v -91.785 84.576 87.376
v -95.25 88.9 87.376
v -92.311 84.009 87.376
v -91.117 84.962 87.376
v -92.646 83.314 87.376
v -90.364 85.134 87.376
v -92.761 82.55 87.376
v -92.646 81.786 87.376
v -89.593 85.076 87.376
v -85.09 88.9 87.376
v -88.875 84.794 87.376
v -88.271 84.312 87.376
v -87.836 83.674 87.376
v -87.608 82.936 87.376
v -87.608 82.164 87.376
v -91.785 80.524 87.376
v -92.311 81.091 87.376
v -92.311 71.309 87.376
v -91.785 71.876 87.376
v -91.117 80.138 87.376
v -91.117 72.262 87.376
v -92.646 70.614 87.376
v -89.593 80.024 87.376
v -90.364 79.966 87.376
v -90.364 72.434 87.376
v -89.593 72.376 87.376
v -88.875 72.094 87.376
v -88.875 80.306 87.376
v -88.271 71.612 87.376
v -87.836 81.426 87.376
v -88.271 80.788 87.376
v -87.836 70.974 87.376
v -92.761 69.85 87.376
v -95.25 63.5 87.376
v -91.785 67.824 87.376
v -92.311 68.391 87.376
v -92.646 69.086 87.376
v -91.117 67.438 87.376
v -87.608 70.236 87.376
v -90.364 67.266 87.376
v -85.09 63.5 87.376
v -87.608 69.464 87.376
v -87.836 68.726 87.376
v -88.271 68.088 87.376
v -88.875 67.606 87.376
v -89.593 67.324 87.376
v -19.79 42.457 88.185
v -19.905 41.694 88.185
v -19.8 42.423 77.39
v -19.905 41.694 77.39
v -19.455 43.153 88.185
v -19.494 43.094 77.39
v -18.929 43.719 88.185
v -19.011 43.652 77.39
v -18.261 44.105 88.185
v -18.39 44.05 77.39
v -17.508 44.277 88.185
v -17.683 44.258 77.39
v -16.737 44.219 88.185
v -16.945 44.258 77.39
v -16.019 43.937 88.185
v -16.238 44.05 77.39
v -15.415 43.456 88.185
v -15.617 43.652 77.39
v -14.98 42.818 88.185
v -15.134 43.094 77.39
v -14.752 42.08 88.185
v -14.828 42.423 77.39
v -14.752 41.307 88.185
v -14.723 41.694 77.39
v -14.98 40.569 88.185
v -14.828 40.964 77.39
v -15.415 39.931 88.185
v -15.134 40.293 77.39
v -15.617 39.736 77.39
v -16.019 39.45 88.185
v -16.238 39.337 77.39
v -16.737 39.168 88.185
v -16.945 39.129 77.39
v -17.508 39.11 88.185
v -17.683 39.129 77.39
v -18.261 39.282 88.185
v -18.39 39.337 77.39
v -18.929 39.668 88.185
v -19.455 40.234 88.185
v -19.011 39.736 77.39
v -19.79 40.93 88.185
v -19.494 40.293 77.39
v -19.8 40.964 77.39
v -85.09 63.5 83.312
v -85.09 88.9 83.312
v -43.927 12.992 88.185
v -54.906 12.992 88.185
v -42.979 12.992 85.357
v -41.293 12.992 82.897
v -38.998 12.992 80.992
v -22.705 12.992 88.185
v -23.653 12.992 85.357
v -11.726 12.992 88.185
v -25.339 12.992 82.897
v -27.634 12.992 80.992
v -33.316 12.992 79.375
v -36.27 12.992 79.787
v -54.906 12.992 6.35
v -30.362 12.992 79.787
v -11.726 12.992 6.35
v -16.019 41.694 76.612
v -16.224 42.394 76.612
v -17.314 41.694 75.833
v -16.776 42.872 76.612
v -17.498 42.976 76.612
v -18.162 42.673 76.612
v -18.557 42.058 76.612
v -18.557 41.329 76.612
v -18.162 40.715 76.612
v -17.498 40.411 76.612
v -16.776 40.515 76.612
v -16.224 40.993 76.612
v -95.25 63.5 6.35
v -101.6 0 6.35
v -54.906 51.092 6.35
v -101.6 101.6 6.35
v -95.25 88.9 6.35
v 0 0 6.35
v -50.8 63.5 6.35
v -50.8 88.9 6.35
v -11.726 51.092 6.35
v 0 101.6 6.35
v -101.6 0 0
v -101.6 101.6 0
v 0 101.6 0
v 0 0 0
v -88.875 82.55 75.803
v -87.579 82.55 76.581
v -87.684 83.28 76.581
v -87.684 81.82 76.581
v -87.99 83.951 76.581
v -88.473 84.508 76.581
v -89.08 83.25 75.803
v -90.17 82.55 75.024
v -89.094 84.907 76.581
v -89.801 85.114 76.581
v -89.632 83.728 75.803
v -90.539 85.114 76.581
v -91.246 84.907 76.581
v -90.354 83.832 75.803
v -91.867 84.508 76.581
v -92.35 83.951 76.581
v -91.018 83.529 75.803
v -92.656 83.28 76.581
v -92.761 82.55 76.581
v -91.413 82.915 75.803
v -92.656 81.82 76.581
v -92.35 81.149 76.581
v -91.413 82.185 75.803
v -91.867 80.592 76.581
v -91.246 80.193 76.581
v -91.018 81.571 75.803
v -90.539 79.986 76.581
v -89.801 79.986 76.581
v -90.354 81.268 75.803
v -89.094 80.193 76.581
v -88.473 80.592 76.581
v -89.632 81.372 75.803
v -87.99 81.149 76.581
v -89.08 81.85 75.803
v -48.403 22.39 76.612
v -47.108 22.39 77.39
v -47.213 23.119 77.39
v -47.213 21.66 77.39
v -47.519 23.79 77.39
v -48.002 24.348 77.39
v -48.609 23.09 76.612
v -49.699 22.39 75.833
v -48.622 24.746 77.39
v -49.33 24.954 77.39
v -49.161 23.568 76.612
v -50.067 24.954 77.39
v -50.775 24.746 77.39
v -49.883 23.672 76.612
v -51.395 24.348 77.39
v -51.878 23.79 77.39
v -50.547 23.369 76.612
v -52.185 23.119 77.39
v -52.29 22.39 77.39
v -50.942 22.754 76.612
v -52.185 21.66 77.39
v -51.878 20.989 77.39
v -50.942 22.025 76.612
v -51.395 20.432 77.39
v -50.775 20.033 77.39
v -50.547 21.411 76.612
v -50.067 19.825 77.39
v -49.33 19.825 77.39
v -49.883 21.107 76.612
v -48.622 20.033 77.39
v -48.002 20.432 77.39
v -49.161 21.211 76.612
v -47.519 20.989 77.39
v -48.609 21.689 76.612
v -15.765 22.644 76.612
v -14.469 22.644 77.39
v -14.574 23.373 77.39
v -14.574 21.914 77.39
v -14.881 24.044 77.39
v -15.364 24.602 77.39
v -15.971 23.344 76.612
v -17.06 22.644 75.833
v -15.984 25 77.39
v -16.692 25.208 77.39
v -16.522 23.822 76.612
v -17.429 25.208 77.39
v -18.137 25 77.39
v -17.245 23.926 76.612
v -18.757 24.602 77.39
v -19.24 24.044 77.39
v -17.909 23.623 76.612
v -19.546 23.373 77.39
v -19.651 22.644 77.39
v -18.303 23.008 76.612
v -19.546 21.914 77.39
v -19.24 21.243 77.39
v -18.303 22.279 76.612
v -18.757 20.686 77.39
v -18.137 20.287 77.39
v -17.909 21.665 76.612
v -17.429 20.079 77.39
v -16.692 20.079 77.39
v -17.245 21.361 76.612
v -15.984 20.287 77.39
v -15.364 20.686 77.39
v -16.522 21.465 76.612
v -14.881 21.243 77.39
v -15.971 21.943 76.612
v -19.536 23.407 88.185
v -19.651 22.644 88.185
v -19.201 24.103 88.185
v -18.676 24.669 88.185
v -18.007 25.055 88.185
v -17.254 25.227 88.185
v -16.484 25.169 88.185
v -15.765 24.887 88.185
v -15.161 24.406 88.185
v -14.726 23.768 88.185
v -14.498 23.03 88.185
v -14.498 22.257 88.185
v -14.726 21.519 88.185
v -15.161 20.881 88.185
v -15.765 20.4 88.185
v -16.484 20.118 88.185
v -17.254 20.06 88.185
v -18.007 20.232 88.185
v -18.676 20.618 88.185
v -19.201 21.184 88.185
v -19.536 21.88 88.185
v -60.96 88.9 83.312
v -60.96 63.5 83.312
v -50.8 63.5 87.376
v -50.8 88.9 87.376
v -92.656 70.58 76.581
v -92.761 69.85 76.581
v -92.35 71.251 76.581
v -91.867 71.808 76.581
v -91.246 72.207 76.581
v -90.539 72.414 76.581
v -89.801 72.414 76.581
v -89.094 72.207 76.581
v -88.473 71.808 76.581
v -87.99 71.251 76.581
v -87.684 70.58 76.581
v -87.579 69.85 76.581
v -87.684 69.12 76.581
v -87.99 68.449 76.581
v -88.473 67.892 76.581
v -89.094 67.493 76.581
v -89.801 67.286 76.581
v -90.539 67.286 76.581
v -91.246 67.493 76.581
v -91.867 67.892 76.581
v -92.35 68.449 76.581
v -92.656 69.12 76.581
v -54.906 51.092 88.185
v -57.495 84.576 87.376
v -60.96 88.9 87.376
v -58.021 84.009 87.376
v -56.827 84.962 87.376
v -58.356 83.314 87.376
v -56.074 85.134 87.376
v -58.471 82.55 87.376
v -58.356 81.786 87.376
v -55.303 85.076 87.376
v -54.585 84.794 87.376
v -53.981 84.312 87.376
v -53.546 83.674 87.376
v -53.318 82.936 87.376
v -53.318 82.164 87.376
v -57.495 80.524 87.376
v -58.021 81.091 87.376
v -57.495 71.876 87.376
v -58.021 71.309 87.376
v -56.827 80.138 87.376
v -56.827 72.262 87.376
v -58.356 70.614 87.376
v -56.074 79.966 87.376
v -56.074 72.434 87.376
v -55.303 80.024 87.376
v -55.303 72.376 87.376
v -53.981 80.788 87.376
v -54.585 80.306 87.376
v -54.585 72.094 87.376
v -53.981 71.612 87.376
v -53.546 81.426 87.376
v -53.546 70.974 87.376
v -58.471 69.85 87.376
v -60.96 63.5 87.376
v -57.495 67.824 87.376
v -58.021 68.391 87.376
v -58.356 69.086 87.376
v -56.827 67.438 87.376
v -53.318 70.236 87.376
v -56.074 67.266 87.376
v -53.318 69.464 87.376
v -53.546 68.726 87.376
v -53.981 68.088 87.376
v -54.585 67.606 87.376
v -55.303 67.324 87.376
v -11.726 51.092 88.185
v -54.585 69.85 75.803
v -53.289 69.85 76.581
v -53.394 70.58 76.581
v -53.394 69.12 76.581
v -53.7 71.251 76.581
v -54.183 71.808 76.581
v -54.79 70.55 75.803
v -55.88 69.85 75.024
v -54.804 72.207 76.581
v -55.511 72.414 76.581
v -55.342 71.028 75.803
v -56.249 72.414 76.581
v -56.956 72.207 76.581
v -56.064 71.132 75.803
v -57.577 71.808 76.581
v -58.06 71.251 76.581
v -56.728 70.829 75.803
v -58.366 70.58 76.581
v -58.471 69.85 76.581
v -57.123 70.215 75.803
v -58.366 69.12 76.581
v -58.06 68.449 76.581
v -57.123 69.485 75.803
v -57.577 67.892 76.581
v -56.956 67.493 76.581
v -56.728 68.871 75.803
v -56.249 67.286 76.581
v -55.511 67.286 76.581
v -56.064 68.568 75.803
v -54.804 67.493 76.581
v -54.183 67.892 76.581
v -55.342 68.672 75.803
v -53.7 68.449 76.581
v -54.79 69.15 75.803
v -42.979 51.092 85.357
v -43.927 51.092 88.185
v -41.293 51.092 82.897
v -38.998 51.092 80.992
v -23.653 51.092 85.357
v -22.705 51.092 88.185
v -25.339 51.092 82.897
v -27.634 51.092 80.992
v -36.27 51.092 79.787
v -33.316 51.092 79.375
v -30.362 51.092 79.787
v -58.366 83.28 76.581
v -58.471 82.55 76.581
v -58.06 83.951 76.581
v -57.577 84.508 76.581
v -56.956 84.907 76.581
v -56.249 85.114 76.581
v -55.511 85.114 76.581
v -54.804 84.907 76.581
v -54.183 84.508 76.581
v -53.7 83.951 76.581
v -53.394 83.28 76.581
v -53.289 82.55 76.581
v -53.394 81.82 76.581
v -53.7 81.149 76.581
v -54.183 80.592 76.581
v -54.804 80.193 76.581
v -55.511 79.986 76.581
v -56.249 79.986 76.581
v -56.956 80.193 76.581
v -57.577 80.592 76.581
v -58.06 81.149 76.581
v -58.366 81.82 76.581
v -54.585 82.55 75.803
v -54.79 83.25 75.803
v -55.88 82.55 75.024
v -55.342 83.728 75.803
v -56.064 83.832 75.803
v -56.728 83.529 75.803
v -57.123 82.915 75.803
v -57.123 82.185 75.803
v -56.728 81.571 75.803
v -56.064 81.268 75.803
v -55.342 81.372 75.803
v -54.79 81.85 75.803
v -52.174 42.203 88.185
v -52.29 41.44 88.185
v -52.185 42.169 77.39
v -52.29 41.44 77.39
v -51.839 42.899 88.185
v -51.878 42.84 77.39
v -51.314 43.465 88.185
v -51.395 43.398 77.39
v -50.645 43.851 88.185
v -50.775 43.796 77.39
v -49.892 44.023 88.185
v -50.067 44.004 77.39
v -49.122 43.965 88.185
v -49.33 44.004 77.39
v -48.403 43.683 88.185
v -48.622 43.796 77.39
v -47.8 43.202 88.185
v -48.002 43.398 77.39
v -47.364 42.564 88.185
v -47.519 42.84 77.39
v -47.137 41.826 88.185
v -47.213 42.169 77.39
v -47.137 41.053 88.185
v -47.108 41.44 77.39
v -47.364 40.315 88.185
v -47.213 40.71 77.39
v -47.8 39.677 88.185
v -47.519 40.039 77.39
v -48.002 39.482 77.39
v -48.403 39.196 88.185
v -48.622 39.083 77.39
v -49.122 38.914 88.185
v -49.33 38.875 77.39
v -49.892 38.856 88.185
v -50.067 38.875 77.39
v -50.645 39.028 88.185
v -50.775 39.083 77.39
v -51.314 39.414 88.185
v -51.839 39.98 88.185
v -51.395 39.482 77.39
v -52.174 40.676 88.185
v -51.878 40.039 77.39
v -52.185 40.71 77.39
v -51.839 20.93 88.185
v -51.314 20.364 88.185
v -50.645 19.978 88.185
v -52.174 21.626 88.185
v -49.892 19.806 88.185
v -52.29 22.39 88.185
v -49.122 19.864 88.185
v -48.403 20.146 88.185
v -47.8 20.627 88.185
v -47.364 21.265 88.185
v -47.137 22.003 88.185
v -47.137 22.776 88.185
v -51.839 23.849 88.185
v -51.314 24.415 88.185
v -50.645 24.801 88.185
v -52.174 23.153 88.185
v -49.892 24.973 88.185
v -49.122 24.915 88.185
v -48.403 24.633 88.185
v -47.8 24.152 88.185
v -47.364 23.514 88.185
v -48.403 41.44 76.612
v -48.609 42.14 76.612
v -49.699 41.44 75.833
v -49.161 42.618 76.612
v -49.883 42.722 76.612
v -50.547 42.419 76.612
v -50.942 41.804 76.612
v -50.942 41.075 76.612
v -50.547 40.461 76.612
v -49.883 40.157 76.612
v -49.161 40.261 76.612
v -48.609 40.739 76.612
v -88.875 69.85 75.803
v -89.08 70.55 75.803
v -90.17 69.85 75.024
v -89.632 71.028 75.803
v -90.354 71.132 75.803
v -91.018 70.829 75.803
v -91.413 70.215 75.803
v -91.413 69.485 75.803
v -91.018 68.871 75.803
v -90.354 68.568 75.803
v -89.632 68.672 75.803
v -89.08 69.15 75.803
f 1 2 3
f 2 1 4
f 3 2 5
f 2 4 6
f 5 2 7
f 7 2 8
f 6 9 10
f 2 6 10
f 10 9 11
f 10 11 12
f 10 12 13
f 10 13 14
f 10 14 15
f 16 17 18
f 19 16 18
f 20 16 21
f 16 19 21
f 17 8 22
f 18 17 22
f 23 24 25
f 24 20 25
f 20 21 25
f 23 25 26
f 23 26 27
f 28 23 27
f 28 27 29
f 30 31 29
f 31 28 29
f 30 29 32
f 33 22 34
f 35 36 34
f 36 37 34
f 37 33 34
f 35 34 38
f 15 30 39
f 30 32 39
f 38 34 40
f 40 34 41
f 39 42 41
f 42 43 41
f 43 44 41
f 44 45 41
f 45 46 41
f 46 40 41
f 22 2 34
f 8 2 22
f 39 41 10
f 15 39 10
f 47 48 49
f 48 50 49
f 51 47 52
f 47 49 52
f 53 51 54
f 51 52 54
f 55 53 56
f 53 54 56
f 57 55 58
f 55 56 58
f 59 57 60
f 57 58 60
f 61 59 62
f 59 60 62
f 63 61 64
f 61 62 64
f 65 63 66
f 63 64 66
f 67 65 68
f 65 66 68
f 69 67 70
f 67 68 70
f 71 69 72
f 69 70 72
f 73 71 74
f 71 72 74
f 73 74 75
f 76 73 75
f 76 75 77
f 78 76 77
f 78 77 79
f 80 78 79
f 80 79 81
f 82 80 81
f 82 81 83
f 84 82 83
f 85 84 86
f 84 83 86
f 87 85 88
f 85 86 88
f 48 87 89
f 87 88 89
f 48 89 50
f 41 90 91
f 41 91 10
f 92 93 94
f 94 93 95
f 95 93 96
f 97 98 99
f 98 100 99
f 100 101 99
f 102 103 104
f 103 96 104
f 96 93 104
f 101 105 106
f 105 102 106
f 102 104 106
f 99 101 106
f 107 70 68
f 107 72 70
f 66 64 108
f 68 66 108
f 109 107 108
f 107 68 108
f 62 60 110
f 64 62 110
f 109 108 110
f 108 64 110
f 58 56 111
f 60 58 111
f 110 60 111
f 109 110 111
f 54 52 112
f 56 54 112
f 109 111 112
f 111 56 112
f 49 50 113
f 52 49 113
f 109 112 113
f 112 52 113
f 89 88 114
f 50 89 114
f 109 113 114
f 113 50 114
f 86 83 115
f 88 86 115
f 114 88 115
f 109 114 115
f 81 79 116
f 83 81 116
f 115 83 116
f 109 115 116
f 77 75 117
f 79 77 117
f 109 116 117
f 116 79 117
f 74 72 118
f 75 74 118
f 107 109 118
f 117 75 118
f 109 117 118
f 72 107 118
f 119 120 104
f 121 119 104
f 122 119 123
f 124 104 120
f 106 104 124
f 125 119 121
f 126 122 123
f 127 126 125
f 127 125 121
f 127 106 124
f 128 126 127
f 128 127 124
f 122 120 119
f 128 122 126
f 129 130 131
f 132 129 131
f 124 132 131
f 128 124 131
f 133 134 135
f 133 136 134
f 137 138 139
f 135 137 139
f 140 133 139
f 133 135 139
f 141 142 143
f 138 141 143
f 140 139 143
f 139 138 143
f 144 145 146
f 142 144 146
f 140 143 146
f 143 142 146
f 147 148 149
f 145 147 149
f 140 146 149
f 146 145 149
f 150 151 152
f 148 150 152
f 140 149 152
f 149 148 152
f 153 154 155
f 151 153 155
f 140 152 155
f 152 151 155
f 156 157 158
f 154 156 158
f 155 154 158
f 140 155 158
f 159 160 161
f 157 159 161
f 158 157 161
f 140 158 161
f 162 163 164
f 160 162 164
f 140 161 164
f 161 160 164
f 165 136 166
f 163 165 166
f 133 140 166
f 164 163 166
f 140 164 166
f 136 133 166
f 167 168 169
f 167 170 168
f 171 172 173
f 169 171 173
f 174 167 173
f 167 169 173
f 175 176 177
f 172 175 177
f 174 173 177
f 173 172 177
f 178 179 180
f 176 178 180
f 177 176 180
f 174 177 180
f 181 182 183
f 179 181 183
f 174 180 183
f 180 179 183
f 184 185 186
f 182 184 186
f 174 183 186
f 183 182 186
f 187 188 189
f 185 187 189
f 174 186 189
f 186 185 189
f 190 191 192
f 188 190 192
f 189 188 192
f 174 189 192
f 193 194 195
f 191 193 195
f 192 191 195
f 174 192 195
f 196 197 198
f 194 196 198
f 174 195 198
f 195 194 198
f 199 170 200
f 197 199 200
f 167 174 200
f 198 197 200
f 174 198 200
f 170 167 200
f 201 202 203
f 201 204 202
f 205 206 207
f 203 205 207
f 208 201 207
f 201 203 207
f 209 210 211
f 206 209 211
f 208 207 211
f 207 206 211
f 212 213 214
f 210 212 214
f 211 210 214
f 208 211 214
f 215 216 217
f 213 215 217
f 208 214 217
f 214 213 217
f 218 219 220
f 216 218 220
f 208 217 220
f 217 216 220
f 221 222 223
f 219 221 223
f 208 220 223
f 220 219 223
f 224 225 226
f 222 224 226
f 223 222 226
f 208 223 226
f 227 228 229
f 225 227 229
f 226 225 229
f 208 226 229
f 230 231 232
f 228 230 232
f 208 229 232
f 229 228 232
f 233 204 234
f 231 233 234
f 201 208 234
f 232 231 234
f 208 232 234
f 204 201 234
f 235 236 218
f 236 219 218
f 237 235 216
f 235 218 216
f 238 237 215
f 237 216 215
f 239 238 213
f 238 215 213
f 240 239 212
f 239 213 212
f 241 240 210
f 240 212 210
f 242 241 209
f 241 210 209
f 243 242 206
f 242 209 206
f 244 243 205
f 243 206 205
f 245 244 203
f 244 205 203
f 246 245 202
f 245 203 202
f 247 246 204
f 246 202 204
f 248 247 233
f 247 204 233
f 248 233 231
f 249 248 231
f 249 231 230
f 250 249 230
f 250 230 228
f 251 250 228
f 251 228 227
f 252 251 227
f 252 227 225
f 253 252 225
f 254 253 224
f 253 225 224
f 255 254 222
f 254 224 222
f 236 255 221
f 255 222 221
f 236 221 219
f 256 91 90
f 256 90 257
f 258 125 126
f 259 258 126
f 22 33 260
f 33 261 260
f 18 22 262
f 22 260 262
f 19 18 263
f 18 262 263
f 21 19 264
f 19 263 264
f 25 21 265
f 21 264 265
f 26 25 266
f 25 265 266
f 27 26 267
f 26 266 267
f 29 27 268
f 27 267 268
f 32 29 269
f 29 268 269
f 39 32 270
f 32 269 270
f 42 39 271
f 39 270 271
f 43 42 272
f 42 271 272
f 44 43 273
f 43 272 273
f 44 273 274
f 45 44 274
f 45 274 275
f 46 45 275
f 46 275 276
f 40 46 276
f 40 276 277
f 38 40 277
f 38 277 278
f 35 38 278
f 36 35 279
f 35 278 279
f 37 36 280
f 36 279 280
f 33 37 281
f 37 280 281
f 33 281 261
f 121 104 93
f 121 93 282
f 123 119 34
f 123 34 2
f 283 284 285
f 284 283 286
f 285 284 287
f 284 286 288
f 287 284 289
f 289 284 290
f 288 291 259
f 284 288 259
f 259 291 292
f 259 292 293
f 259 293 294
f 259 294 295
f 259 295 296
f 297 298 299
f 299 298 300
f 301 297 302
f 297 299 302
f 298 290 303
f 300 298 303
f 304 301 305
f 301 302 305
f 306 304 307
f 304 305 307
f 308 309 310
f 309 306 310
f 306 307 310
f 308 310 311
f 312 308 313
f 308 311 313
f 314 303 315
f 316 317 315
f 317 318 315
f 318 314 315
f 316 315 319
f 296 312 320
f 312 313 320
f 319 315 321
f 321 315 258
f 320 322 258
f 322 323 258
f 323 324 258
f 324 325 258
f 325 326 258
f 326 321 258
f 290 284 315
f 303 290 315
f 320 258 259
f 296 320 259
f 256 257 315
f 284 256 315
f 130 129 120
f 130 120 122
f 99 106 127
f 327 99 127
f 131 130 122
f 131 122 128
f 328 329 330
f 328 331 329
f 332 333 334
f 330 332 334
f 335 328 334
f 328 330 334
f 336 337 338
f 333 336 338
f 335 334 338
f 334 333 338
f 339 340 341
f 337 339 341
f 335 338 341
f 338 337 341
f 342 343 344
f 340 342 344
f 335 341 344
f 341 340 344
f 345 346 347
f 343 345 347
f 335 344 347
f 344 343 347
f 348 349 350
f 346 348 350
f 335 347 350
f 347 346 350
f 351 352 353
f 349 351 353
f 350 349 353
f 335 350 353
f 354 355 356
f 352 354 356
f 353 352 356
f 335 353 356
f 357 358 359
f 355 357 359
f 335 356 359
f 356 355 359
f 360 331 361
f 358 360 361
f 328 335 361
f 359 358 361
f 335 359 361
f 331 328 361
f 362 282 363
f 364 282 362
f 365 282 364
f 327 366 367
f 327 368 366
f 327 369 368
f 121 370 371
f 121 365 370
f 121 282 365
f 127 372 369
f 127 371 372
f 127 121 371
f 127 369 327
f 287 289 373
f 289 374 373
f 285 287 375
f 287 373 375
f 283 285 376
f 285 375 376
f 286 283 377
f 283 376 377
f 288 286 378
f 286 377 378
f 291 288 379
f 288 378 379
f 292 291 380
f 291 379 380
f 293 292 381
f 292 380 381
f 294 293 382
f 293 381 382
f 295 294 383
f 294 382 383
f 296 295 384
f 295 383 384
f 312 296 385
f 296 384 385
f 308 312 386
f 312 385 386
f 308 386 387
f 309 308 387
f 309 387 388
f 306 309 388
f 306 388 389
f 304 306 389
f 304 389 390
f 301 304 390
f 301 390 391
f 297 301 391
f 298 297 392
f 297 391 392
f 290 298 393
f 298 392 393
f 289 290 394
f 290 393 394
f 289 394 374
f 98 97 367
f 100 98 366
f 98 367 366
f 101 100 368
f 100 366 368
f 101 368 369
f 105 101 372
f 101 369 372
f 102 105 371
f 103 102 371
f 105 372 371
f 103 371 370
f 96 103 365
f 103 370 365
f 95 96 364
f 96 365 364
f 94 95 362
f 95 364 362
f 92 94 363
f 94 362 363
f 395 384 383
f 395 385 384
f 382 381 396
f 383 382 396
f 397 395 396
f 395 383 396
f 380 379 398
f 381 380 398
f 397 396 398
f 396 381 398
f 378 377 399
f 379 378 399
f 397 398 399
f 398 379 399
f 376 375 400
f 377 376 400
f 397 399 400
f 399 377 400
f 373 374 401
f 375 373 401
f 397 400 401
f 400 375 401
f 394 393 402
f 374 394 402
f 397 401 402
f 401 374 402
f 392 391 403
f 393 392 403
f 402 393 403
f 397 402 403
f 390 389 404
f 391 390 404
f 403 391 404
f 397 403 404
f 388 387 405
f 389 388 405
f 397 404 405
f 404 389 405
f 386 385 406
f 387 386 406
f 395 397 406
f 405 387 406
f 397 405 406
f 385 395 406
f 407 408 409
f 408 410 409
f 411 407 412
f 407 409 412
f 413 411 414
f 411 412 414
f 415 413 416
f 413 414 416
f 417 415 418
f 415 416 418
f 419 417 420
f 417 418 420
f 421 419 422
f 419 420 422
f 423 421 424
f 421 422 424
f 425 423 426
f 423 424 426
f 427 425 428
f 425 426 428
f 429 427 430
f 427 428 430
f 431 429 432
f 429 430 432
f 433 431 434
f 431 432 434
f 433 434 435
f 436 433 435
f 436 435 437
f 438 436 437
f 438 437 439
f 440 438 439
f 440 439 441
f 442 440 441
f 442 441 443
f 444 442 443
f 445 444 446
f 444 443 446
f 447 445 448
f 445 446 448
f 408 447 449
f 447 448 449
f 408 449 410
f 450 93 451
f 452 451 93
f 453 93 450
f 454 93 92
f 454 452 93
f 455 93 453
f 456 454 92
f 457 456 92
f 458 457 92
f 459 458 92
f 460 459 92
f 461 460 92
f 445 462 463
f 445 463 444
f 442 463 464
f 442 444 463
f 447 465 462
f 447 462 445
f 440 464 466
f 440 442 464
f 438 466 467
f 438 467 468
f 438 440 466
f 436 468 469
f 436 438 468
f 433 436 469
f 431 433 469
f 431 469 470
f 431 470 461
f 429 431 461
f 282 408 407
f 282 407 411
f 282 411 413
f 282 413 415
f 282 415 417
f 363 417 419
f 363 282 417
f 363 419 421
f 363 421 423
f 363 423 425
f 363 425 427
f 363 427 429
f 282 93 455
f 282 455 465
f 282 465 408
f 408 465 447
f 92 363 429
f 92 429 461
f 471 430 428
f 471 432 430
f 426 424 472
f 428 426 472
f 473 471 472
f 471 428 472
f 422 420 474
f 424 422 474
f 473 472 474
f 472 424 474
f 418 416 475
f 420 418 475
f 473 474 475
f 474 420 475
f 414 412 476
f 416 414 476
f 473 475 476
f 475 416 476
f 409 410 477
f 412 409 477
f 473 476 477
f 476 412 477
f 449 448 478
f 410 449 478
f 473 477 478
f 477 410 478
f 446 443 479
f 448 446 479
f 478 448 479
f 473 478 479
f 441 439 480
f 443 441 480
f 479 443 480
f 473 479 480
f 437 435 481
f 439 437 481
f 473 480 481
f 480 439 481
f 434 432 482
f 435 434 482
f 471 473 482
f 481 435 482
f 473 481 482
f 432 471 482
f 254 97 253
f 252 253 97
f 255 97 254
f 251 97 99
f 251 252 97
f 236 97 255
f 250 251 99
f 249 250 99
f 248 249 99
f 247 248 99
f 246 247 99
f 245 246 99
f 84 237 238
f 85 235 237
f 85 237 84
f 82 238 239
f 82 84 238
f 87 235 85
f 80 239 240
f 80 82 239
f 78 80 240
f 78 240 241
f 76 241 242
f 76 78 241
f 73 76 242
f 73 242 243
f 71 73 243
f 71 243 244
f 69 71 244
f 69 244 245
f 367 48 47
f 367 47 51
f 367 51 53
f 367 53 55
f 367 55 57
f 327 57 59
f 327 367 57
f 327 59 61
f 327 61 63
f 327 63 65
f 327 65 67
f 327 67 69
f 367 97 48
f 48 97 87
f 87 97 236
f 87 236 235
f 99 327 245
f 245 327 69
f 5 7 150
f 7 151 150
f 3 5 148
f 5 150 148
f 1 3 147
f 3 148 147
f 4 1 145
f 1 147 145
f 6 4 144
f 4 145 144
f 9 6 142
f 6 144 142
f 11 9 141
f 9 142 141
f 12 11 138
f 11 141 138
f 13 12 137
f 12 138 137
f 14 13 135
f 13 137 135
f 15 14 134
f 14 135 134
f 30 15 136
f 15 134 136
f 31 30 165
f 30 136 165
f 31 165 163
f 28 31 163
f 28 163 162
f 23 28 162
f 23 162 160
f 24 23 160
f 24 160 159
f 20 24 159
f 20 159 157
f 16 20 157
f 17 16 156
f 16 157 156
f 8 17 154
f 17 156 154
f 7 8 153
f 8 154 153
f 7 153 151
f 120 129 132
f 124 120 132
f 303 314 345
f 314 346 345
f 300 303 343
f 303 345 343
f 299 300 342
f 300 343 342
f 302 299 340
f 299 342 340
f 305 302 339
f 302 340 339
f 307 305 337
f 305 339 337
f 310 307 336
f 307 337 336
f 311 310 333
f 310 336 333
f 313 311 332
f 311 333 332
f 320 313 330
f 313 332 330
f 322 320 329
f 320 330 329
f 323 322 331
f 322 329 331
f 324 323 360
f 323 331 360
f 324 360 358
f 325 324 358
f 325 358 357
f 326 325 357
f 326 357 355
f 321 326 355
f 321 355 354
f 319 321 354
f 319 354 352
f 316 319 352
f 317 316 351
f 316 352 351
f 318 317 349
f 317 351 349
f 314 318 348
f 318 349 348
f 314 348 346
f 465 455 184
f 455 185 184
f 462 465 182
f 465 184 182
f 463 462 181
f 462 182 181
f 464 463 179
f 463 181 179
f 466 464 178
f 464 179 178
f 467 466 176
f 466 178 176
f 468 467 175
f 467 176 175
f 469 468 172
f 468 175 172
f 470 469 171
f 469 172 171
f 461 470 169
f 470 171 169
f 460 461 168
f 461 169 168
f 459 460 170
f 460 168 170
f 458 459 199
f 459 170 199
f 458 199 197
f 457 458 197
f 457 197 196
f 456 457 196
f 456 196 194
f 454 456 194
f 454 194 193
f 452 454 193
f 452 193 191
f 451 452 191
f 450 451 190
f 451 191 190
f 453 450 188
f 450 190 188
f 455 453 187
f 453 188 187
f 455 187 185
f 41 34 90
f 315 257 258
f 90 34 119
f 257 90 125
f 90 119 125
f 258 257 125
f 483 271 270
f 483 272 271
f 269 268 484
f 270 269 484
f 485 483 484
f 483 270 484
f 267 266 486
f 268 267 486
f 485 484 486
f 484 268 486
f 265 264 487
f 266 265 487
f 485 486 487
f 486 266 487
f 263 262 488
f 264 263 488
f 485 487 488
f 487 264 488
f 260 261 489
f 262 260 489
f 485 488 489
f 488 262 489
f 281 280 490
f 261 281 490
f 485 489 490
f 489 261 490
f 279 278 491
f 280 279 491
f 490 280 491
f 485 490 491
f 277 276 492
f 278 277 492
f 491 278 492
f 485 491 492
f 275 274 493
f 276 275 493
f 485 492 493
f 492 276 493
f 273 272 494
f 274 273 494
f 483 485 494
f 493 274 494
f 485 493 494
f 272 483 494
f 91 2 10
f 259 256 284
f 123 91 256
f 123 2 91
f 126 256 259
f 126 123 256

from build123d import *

# Parameters (mm, degrees)
SKETCH1_W                      = 101.6
SKETCH1_H                      = 101.6
BOSS_EXTRUDE1_DEPTH            = 6.35
SKETCH2_W                      = 44.45
SKETCH2_H                      = 25.4
BOSS_EXTRUDE3_DEPTH            = 101.6
SKETCH4_W                      = 24.13
SKETCH4_H                      = 11.938
CUT_EXTRUDE1_DEPTH             = 101.6
SKETCH5_W                      = 43.18
SKETCH5_H                      = 38.1
BOSS_EXTRUDE4_DEPTH            = 101.6
SKETCH6_R                      = 10.795
CUT_EXTRUDE2_DEPTH             = 157.799568366
SKETCH7_W                      = 43.18
SKETCH7_H                      = 17.859873976
CUT_EXTRUDE3_DEPTH             = 157.799568366
CUT_EXTRUDE4_REACH             = 174.855
SKETCH8_W                      = 44.45
SKETCH8_H                      = 18.669
F_6_0_204_DIAMETER_HOLE1_D     = 5.1816
F_6_0_204_DIAMETER_HOLE1_DEPTH = 12.7
F_6_0_204_DIAMETER_HOLE1_TIP   = 1.556709692
F_6_0_204_DIAMETER_HOLE2_D     = 5.1816
F_6_0_204_DIAMETER_HOLE2_DEPTH = 12.7
F_6_0_204_DIAMETER_HOLE2_TIP   = 1.556709692
CUT_EXTRUDE5_START             = -38.1
SKETCH17_W                     = 43.18
SKETCH17_H                     = 1.905
CUT_EXTRUDE5_DEPTH             = 38.1
CUT_EXTRUDE6_START             = -25.4
SKETCH18_W                     = 44.45
SKETCH18_H                     = 1.905
CUT_EXTRUDE6_DEPTH             = 25.4


with BuildPart() as part:
    # Sketch1 → Boss-Extrude1 (new body)
    with BuildSketch(Plane.XY):
        with Locations((-50.8, 50.8)):
            Rectangle(SKETCH1_W, SKETCH1_H)
    extrude(amount=BOSS_EXTRUDE1_DEPTH)

    # Sketch2 → Boss-Extrude3 (add)
    with BuildSketch(Plane.XY.offset(6.35)):
        with Locations((-73.025, 76.2)):
            Rectangle(SKETCH2_W, SKETCH2_H)
    extrude(amount=BOSS_EXTRUDE3_DEPTH)

    # Sketch4 → Cut-Extrude1 (cut)
    with BuildSketch(Plane.XZ.offset(-63.5)):
        with Locations((-73.025, 89.281)):
            Rectangle(SKETCH4_W, SKETCH4_H)
    extrude(amount=-CUT_EXTRUDE1_DEPTH, mode=Mode.SUBTRACT)

    # Sketch5 → Boss-Extrude4 (add)
    with BuildSketch(Plane.XY.offset(6.35)):
        with Locations((-33.315999359, 32.041507513)):
            Rectangle(SKETCH5_W, SKETCH5_H)
    extrude(amount=BOSS_EXTRUDE4_DEPTH)

    # Sketch6 → Cut-Extrude2 (cut, through all)
    with BuildSketch(Plane(origin=(0, 51.091507513, 0), x_dir=(1, 0, 0), z_dir=(0, 1, 0))):
        with Locations(Location((-33.315999359, -90.17, 0), (0, 0, 270))):
            Circle(SKETCH6_R)
    extrude(amount=-CUT_EXTRUDE2_DEPTH, mode=Mode.SUBTRACT)

    # Sketch7 → Cut-Extrude3 (cut, through all)
    with BuildSketch(Plane(origin=(0, 51.091507513, 0), x_dir=(1, 0, 0), z_dir=(0, 1, 0))):
        with Locations((-33.315999359, -99.020063012)):
            Rectangle(SKETCH7_W, SKETCH7_H)
    extrude(amount=-CUT_EXTRUDE3_DEPTH, mode=Mode.SUBTRACT)

    # Sketch8 → Cut-Extrude4 (cut, up to next)
    with BuildSketch(Plane(origin=(0, 88.9, 0), x_dir=(1, 0, 0), z_dir=(0, 1, 0)), mode=Mode.PRIVATE) as cut_extrude4_sk1:
        with Locations((-73.025, -98.6155)):
            Rectangle(SKETCH8_W, SKETCH8_H)
    cut_extrude4_tool1 = extrude(cut_extrude4_sk1.sketch, amount=-CUT_EXTRUDE4_REACH, mode=Mode.PRIVATE) & part.part
    add(cut_extrude4_tool1.solids().sort_by_distance((-73.025, 88.9, 98.6155))[0], mode=Mode.SUBTRACT)

    # #6 (0.204) Diameter Hole1
    with Locations(Plane.XY.offset(90.090126024)):
        with Locations((-17.060294864, 22.643507513), (-17.313999359, 41.693507513), (-49.698703855, 41.439507513), (-49.698703855, 22.389507513)):
            Hole(F_6_0_204_DIAMETER_HOLE1_D / 2, depth=F_6_0_204_DIAMETER_HOLE1_DEPTH)
            with Locations((0, 0, -(F_6_0_204_DIAMETER_HOLE1_DEPTH + F_6_0_204_DIAMETER_HOLE1_TIP / 2))):  # 118° drill point
                Cone(0, F_6_0_204_DIAMETER_HOLE1_D / 2, F_6_0_204_DIAMETER_HOLE1_TIP, mode=Mode.SUBTRACT)

    # #6 (0.204) Diameter Hole2
    with Locations(Plane.XY.offset(89.281)):
        with Locations((-55.88, 82.55), (-55.88, 69.85), (-90.17, 82.55), (-90.17, 69.85)):
            Hole(F_6_0_204_DIAMETER_HOLE2_D / 2, depth=F_6_0_204_DIAMETER_HOLE2_DEPTH)
            with Locations((0, 0, -(F_6_0_204_DIAMETER_HOLE2_DEPTH + F_6_0_204_DIAMETER_HOLE2_TIP / 2))):  # 118° drill point
                Cone(0, F_6_0_204_DIAMETER_HOLE2_D / 2, F_6_0_204_DIAMETER_HOLE2_TIP, mode=Mode.SUBTRACT)

    # Sketch17 → Cut-Extrude5 (cut)
    with BuildSketch(Plane.XZ.offset(-12.991507513).offset(CUT_EXTRUDE5_START)):
        with Locations((-33.315999359, 89.137626024)):
            Rectangle(SKETCH17_W, SKETCH17_H)
    extrude(amount=CUT_EXTRUDE5_DEPTH, mode=Mode.SUBTRACT)

    # Sketch18 → Cut-Extrude6 (cut)
    with BuildSketch(Plane(origin=(0, 88.9, 0), x_dir=(1, 0, 0), z_dir=(0, 1, 0)).offset(CUT_EXTRUDE6_START)):
        with Locations((-73.025, -88.3285)):
            Rectangle(SKETCH18_W, SKETCH18_H)
    extrude(amount=CUT_EXTRUDE6_DEPTH, mode=Mode.SUBTRACT)


solid = part.part
